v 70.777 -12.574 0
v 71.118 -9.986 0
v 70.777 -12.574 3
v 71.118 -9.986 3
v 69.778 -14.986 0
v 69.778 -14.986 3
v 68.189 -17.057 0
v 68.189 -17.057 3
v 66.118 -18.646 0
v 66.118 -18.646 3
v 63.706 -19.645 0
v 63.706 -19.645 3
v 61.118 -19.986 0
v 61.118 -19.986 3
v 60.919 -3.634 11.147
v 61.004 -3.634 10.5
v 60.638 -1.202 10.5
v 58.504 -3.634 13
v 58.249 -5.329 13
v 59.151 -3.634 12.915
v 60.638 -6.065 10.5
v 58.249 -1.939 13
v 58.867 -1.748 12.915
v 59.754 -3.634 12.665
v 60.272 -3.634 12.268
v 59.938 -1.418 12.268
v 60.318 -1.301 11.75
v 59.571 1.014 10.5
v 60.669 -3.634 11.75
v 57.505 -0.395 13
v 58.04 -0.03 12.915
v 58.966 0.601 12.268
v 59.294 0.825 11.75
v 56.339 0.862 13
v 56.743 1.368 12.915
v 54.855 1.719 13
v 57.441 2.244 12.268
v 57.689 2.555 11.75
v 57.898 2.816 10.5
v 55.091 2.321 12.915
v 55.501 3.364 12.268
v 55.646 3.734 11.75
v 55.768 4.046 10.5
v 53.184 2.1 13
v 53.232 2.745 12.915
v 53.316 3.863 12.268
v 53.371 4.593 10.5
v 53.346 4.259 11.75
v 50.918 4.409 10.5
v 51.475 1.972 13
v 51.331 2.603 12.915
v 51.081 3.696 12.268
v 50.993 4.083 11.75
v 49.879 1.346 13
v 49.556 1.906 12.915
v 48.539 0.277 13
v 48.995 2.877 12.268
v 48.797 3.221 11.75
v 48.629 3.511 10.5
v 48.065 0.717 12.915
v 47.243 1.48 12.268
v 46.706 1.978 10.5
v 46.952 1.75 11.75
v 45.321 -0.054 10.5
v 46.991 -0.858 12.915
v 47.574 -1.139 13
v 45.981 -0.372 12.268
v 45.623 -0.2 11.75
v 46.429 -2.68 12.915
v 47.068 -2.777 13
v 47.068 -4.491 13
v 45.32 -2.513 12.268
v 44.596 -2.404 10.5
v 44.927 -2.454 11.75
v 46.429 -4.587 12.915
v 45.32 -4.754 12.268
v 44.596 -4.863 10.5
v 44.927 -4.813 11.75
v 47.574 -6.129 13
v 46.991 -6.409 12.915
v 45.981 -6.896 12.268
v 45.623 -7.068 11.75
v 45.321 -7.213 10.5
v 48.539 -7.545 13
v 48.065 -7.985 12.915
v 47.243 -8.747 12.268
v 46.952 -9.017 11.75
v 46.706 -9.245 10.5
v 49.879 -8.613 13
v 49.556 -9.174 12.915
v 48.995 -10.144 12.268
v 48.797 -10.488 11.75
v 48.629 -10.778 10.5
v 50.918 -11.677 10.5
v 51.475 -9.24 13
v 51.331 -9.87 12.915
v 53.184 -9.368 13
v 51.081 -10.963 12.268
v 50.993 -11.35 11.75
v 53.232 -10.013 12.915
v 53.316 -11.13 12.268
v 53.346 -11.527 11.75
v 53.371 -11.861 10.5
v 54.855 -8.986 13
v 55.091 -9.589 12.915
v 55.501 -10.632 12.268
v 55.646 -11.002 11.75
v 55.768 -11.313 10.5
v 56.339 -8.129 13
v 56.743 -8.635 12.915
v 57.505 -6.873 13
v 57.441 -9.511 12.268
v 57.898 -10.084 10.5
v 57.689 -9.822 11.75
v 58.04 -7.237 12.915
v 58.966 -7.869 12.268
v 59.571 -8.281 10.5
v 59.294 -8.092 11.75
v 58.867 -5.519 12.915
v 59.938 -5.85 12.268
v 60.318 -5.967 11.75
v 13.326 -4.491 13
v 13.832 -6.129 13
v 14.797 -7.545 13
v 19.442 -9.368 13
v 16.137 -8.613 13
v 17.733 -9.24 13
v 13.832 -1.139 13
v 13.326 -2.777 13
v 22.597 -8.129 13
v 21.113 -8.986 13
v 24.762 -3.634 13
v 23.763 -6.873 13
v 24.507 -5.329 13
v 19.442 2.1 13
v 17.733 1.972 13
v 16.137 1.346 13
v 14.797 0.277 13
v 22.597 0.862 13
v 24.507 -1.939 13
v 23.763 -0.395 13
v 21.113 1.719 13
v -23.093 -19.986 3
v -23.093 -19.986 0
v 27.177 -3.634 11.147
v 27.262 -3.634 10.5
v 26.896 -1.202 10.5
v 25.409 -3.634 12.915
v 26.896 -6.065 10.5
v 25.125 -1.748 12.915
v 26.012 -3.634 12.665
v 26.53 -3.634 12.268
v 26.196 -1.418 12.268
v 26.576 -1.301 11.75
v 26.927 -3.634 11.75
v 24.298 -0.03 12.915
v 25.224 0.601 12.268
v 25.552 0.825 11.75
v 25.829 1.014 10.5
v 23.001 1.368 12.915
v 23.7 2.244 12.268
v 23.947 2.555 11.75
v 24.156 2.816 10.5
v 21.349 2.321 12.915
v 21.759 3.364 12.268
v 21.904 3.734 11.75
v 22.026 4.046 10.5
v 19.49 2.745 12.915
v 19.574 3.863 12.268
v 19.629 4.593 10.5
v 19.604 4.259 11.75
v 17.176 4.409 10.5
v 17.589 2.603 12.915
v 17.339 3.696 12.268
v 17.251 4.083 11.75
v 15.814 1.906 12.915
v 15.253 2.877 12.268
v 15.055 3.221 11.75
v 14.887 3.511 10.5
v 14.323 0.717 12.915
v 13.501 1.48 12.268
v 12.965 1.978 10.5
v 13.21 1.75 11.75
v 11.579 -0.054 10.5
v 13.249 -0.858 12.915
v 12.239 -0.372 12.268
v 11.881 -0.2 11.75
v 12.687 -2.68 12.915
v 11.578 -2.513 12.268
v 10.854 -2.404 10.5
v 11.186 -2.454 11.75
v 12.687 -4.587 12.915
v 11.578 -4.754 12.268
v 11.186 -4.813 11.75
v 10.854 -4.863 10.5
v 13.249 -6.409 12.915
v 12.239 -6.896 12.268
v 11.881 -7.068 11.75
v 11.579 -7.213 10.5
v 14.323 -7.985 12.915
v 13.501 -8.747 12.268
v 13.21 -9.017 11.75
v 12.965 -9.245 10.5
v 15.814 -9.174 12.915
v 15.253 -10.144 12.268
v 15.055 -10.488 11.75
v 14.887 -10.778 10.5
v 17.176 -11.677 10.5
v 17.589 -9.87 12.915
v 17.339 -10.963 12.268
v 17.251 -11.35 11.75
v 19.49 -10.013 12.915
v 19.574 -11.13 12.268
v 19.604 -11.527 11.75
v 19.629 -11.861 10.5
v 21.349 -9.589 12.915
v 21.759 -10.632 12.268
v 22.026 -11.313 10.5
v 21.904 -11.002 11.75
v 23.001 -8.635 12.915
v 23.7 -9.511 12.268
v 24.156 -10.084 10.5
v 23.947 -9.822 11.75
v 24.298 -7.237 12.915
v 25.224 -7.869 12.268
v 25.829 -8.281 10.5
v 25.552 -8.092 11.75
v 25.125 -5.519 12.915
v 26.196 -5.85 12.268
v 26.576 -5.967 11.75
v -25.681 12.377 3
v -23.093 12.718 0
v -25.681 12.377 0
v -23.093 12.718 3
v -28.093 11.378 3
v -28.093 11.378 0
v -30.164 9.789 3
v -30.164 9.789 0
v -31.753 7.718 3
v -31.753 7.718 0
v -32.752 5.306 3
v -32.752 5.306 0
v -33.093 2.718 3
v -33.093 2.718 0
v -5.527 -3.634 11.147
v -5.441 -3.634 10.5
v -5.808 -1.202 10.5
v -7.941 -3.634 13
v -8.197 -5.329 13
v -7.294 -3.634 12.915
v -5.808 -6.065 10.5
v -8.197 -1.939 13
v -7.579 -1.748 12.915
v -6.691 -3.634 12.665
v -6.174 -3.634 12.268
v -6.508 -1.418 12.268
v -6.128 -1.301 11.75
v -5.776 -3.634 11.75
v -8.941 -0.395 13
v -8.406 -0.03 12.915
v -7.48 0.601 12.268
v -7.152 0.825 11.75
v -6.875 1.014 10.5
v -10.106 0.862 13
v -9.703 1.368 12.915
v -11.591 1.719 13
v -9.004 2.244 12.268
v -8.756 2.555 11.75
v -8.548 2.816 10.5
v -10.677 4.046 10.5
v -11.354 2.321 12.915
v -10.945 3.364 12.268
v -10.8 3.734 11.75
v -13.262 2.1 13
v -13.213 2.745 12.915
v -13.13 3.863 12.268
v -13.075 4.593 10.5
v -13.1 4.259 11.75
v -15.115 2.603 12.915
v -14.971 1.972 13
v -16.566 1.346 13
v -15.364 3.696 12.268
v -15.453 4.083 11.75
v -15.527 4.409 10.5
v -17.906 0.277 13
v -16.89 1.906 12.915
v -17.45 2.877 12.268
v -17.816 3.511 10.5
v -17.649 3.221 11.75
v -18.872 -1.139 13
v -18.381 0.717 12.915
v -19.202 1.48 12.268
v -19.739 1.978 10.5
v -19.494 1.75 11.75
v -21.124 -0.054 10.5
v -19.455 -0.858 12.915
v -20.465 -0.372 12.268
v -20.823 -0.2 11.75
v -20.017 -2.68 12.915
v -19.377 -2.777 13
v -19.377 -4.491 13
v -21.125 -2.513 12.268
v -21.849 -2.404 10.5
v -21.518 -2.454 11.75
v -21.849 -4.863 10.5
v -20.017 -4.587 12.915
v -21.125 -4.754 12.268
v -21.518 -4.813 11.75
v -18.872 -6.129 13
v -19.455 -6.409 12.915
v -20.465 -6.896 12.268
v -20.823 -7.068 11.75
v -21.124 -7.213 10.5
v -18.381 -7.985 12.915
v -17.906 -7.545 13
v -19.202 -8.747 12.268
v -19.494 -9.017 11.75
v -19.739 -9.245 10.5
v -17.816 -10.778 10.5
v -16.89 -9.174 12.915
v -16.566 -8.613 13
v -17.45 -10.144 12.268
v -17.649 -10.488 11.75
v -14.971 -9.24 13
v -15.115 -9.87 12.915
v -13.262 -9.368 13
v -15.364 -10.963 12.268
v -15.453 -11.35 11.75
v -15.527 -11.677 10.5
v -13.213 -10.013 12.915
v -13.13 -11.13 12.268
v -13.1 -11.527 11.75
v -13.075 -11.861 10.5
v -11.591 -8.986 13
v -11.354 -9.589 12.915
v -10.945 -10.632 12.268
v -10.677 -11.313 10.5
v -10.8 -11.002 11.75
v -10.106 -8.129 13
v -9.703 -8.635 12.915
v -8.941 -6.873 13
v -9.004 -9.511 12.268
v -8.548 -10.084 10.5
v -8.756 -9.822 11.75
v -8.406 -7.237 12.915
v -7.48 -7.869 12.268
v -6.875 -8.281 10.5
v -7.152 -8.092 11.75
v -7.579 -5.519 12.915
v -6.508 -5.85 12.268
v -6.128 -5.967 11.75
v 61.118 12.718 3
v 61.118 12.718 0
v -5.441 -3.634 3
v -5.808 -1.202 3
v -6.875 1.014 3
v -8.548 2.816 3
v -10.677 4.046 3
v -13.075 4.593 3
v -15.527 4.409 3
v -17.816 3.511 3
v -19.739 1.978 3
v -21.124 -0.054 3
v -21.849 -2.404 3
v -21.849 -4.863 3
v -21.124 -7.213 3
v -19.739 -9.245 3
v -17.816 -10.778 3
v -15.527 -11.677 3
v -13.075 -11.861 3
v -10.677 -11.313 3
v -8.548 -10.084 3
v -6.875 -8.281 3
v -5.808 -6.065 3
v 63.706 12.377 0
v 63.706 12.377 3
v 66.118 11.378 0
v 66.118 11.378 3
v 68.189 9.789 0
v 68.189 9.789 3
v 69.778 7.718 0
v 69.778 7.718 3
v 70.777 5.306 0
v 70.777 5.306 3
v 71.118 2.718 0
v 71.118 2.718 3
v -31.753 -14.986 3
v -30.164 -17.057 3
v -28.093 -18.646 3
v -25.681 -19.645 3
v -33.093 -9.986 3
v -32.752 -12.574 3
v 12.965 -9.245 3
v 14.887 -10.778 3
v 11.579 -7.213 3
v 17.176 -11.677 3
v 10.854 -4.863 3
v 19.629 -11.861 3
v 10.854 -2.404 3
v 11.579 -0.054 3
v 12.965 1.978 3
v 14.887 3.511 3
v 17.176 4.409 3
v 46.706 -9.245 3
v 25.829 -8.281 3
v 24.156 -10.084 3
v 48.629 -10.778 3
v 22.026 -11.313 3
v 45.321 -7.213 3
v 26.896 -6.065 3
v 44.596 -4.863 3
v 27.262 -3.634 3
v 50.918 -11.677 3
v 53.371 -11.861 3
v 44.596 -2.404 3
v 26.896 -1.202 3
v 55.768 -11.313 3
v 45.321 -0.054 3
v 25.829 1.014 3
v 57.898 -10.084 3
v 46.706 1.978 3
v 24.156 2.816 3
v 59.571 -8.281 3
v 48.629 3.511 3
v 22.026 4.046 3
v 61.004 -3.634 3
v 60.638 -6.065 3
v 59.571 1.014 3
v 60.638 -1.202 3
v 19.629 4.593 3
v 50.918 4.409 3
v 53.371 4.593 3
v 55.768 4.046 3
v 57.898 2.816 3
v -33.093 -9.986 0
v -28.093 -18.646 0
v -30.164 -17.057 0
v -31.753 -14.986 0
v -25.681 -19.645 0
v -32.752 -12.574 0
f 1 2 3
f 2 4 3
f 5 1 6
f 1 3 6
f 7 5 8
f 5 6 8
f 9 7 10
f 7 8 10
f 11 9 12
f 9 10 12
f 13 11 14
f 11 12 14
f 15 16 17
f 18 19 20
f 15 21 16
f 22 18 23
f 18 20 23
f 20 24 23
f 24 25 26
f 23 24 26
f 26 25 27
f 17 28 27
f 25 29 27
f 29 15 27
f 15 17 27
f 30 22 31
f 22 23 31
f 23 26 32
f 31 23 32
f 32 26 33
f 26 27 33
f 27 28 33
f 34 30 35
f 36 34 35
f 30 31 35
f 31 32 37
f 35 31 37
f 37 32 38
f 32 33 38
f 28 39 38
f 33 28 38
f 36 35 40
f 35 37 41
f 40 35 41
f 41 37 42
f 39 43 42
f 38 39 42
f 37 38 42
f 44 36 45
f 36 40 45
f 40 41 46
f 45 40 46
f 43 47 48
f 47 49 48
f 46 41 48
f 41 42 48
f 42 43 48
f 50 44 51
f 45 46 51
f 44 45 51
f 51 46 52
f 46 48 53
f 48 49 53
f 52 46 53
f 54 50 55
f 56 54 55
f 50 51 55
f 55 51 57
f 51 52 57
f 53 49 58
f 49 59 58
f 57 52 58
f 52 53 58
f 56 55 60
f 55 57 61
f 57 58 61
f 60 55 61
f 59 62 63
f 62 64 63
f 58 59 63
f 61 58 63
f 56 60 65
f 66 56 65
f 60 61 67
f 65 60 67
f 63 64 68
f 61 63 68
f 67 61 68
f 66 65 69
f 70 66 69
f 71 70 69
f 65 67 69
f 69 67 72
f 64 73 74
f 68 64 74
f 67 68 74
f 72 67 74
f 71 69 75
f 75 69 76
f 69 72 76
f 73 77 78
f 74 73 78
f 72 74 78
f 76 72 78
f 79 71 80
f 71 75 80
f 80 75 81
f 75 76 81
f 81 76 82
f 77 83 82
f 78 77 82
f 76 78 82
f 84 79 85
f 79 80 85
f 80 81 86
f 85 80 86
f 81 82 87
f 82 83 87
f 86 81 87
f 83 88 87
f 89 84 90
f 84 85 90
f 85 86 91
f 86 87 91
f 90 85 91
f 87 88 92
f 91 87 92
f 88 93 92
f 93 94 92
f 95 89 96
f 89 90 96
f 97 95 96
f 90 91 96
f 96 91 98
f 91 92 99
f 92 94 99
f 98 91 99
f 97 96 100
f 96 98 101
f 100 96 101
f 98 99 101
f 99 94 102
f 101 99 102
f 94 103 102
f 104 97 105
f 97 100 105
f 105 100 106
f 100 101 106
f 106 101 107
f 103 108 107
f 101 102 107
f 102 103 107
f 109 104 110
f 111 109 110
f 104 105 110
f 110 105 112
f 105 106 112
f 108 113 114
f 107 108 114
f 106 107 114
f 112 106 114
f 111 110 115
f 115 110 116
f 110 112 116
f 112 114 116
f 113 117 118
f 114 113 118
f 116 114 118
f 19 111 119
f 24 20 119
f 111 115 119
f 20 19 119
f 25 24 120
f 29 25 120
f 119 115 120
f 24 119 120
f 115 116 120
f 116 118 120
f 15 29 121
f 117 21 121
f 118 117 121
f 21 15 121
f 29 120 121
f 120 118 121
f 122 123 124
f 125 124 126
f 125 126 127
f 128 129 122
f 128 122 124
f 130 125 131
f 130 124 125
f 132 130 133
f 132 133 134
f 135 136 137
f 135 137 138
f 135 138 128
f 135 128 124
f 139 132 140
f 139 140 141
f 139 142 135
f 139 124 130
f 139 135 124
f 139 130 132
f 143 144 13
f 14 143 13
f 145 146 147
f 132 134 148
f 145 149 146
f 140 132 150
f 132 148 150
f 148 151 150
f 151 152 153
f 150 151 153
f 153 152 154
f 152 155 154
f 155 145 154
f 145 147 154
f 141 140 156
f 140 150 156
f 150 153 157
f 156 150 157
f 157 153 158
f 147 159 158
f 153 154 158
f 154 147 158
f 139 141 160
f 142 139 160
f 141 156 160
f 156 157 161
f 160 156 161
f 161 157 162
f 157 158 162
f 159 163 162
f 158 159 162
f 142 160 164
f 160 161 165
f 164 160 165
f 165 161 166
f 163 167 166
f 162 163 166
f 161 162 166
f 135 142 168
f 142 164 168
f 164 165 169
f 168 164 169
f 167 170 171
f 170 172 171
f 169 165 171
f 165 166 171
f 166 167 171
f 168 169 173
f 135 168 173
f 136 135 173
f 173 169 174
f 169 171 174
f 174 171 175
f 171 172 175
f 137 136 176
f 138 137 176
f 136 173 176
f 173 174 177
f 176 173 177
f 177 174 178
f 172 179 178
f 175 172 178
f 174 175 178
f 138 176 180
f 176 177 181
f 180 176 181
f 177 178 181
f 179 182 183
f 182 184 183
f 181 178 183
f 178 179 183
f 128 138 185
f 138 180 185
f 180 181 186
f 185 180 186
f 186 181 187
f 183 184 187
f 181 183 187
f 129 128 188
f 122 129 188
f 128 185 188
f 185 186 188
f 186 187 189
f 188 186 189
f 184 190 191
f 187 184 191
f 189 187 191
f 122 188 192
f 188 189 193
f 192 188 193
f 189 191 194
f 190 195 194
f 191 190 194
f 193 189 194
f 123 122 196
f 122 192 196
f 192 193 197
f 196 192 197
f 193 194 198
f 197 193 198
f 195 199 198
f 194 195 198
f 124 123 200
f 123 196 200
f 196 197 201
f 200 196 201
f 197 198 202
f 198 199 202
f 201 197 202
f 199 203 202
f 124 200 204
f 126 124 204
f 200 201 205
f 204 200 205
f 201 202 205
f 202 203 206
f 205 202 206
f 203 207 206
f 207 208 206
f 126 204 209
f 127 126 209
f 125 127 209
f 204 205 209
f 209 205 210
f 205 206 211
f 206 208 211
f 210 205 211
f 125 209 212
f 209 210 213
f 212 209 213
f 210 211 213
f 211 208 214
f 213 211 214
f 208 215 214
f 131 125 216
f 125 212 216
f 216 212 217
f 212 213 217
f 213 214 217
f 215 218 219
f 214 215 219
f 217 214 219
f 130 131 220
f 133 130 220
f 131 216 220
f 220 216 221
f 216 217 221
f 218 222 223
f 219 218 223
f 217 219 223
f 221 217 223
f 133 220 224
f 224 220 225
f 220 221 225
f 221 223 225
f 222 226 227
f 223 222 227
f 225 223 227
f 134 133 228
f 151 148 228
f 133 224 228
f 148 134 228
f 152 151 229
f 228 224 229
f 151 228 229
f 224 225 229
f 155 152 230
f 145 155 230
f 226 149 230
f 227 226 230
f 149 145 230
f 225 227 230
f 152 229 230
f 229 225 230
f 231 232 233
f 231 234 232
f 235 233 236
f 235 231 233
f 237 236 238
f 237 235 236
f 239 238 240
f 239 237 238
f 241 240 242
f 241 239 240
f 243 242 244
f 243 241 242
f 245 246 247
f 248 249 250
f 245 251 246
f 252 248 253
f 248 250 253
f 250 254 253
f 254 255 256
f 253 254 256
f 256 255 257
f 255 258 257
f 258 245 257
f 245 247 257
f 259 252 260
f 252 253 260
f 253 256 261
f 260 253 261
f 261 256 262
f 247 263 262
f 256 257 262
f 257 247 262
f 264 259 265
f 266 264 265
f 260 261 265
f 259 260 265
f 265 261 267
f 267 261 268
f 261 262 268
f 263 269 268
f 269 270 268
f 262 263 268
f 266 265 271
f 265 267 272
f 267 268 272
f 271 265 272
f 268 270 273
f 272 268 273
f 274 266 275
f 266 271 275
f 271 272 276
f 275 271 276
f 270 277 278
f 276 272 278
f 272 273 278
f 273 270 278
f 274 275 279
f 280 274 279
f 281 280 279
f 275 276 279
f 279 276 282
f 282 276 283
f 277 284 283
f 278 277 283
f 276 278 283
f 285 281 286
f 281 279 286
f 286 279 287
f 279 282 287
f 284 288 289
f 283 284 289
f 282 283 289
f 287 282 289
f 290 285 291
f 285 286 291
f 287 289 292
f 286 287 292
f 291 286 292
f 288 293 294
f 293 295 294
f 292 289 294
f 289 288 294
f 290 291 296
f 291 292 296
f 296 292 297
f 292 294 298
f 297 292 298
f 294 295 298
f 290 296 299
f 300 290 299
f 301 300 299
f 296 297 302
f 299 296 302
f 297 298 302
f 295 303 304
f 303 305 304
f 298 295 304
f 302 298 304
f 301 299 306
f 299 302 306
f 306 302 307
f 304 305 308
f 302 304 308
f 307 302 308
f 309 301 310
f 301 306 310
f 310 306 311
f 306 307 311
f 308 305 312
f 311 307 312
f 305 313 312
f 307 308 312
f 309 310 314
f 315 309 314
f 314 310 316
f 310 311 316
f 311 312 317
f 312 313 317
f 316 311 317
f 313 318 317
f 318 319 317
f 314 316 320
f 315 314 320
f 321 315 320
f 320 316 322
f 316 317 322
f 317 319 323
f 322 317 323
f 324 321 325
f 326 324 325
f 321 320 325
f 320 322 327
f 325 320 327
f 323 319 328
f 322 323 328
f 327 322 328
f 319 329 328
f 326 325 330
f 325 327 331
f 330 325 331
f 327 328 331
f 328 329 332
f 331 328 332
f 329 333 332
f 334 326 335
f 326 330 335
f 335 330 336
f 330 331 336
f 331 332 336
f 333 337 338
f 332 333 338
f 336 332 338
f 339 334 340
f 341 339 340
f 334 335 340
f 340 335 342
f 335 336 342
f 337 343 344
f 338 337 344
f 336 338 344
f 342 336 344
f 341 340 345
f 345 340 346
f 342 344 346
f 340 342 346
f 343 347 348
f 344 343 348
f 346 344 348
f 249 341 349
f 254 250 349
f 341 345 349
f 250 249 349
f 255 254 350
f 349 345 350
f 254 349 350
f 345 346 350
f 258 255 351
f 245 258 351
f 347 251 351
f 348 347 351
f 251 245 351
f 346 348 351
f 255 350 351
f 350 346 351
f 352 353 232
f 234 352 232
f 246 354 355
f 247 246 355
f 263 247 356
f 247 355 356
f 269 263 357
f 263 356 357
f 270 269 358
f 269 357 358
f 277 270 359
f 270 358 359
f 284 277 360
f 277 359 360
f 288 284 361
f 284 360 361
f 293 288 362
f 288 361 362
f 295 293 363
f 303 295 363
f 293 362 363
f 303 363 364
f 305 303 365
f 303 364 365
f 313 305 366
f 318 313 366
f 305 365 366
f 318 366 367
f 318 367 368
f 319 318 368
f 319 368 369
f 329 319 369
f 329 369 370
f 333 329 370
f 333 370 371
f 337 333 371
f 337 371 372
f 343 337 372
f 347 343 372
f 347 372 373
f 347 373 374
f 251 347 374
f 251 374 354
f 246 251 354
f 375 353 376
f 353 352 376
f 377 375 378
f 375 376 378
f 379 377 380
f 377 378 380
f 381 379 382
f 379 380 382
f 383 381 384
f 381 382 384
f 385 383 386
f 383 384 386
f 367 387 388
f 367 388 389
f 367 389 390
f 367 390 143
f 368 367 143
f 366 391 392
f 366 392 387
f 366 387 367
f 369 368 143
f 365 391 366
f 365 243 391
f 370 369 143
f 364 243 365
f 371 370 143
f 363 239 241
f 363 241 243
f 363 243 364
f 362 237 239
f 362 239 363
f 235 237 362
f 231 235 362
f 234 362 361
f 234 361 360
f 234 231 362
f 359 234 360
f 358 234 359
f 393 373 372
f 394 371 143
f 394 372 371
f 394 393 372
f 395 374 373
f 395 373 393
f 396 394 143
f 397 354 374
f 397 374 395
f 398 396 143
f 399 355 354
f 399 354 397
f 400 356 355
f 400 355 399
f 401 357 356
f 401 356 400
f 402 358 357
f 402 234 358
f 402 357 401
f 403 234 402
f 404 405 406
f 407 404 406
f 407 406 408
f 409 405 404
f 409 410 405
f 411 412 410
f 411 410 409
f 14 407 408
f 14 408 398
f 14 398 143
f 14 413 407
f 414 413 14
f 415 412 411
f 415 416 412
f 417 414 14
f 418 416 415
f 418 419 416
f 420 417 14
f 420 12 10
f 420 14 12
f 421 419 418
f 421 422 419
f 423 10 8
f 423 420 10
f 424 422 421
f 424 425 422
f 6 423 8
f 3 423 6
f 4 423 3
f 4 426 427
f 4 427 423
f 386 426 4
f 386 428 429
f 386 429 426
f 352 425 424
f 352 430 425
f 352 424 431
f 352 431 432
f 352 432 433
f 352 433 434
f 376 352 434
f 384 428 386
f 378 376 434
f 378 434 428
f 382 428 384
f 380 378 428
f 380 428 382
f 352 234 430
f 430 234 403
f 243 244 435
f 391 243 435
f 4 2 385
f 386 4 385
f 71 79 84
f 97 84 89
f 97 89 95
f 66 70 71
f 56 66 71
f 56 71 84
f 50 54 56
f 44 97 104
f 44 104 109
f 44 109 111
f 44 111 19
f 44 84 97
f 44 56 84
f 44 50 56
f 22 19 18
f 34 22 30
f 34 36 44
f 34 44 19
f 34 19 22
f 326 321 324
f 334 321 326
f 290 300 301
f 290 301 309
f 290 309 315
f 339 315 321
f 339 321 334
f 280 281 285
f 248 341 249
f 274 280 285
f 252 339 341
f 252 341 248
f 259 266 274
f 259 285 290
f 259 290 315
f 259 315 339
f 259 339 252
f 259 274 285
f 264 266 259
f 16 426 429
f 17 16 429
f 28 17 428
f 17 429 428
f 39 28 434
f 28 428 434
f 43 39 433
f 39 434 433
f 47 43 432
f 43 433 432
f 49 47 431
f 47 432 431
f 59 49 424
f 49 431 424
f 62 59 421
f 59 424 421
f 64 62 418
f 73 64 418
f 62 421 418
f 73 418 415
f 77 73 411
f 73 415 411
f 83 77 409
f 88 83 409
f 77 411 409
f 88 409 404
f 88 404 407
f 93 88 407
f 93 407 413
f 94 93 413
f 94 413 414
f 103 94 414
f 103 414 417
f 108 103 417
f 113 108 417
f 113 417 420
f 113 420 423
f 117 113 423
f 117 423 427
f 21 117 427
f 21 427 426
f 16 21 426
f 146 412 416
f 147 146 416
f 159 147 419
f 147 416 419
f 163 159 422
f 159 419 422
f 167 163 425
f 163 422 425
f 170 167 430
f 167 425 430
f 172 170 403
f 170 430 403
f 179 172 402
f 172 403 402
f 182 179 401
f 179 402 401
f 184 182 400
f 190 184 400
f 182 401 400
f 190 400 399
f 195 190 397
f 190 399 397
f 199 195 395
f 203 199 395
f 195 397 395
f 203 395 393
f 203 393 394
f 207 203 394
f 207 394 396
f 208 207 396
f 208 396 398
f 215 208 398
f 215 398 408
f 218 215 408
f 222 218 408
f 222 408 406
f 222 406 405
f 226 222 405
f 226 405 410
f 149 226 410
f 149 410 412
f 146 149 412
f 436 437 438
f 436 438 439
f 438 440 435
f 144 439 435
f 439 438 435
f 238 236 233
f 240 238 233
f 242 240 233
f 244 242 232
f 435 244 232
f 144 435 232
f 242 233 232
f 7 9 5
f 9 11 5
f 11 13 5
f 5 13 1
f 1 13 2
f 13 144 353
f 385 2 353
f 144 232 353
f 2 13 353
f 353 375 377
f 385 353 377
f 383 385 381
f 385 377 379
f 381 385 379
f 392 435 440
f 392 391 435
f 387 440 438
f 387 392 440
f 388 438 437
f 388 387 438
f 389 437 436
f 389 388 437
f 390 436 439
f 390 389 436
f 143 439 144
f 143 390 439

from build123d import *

# Parameters (mm, degrees)
SKETCH1_W           = 104.210537284
SKETCH1_H           = 32.703680443
BOSS_EXTRUDE1_DEPTH = 3
SKETCH1_3_R         = 8.25
BOSS_EXTRUDE2_DEPTH = 13
FILLET1_R           = 10
FILLET2_R           = 2.5


with BuildPart() as part:
    # Sketch1 → Boss-Extrude1 (new body)
    with BuildSketch(Plane.XY):
        with Locations((19.01225867, -3.633742272)):
            Rectangle(SKETCH1_W, SKETCH1_H)
    extrude(amount=BOSS_EXTRUDE1_DEPTH)

    # Sketch1<3> → Boss-Extrude2 (add)
    with BuildSketch(Plane.XY):
        with Locations((52.754151191, -3.633742271)):
            Circle(SKETCH1_3_R)
        with Locations((19.01225867, -3.633742271)):
            Circle(SKETCH1_3_R)
        with Locations((-13.691421773, -3.633742271)):
            Circle(SKETCH1_3_R)
    extrude(amount=BOSS_EXTRUDE2_DEPTH)

    # Fillet1
    fillet1_edges = [part.edges().sort_by_distance(p)[0] for p in [
        (71.117527312, 12.71809795, 1.5),
        (71.117527312, -19.985582493, 1.5),
        (-33.093009972, -19.985582493, 1.5),
        (-33.093009972, 12.71809795, 1.5),
    ]]
    fillet(fillet1_edges, radius=FILLET1_R)

    # Fillet2
    fillet2_edges = [part.edges().sort_by_distance(p)[0] for p in [
        (44.504151191, -3.633742271, 13),
        (10.76225867, -3.633742271, 13),
        (-21.941421773, -3.633742271, 13),
    ]]
    fillet(fillet2_edges, radius=FILLET2_R)


solid = part.part
